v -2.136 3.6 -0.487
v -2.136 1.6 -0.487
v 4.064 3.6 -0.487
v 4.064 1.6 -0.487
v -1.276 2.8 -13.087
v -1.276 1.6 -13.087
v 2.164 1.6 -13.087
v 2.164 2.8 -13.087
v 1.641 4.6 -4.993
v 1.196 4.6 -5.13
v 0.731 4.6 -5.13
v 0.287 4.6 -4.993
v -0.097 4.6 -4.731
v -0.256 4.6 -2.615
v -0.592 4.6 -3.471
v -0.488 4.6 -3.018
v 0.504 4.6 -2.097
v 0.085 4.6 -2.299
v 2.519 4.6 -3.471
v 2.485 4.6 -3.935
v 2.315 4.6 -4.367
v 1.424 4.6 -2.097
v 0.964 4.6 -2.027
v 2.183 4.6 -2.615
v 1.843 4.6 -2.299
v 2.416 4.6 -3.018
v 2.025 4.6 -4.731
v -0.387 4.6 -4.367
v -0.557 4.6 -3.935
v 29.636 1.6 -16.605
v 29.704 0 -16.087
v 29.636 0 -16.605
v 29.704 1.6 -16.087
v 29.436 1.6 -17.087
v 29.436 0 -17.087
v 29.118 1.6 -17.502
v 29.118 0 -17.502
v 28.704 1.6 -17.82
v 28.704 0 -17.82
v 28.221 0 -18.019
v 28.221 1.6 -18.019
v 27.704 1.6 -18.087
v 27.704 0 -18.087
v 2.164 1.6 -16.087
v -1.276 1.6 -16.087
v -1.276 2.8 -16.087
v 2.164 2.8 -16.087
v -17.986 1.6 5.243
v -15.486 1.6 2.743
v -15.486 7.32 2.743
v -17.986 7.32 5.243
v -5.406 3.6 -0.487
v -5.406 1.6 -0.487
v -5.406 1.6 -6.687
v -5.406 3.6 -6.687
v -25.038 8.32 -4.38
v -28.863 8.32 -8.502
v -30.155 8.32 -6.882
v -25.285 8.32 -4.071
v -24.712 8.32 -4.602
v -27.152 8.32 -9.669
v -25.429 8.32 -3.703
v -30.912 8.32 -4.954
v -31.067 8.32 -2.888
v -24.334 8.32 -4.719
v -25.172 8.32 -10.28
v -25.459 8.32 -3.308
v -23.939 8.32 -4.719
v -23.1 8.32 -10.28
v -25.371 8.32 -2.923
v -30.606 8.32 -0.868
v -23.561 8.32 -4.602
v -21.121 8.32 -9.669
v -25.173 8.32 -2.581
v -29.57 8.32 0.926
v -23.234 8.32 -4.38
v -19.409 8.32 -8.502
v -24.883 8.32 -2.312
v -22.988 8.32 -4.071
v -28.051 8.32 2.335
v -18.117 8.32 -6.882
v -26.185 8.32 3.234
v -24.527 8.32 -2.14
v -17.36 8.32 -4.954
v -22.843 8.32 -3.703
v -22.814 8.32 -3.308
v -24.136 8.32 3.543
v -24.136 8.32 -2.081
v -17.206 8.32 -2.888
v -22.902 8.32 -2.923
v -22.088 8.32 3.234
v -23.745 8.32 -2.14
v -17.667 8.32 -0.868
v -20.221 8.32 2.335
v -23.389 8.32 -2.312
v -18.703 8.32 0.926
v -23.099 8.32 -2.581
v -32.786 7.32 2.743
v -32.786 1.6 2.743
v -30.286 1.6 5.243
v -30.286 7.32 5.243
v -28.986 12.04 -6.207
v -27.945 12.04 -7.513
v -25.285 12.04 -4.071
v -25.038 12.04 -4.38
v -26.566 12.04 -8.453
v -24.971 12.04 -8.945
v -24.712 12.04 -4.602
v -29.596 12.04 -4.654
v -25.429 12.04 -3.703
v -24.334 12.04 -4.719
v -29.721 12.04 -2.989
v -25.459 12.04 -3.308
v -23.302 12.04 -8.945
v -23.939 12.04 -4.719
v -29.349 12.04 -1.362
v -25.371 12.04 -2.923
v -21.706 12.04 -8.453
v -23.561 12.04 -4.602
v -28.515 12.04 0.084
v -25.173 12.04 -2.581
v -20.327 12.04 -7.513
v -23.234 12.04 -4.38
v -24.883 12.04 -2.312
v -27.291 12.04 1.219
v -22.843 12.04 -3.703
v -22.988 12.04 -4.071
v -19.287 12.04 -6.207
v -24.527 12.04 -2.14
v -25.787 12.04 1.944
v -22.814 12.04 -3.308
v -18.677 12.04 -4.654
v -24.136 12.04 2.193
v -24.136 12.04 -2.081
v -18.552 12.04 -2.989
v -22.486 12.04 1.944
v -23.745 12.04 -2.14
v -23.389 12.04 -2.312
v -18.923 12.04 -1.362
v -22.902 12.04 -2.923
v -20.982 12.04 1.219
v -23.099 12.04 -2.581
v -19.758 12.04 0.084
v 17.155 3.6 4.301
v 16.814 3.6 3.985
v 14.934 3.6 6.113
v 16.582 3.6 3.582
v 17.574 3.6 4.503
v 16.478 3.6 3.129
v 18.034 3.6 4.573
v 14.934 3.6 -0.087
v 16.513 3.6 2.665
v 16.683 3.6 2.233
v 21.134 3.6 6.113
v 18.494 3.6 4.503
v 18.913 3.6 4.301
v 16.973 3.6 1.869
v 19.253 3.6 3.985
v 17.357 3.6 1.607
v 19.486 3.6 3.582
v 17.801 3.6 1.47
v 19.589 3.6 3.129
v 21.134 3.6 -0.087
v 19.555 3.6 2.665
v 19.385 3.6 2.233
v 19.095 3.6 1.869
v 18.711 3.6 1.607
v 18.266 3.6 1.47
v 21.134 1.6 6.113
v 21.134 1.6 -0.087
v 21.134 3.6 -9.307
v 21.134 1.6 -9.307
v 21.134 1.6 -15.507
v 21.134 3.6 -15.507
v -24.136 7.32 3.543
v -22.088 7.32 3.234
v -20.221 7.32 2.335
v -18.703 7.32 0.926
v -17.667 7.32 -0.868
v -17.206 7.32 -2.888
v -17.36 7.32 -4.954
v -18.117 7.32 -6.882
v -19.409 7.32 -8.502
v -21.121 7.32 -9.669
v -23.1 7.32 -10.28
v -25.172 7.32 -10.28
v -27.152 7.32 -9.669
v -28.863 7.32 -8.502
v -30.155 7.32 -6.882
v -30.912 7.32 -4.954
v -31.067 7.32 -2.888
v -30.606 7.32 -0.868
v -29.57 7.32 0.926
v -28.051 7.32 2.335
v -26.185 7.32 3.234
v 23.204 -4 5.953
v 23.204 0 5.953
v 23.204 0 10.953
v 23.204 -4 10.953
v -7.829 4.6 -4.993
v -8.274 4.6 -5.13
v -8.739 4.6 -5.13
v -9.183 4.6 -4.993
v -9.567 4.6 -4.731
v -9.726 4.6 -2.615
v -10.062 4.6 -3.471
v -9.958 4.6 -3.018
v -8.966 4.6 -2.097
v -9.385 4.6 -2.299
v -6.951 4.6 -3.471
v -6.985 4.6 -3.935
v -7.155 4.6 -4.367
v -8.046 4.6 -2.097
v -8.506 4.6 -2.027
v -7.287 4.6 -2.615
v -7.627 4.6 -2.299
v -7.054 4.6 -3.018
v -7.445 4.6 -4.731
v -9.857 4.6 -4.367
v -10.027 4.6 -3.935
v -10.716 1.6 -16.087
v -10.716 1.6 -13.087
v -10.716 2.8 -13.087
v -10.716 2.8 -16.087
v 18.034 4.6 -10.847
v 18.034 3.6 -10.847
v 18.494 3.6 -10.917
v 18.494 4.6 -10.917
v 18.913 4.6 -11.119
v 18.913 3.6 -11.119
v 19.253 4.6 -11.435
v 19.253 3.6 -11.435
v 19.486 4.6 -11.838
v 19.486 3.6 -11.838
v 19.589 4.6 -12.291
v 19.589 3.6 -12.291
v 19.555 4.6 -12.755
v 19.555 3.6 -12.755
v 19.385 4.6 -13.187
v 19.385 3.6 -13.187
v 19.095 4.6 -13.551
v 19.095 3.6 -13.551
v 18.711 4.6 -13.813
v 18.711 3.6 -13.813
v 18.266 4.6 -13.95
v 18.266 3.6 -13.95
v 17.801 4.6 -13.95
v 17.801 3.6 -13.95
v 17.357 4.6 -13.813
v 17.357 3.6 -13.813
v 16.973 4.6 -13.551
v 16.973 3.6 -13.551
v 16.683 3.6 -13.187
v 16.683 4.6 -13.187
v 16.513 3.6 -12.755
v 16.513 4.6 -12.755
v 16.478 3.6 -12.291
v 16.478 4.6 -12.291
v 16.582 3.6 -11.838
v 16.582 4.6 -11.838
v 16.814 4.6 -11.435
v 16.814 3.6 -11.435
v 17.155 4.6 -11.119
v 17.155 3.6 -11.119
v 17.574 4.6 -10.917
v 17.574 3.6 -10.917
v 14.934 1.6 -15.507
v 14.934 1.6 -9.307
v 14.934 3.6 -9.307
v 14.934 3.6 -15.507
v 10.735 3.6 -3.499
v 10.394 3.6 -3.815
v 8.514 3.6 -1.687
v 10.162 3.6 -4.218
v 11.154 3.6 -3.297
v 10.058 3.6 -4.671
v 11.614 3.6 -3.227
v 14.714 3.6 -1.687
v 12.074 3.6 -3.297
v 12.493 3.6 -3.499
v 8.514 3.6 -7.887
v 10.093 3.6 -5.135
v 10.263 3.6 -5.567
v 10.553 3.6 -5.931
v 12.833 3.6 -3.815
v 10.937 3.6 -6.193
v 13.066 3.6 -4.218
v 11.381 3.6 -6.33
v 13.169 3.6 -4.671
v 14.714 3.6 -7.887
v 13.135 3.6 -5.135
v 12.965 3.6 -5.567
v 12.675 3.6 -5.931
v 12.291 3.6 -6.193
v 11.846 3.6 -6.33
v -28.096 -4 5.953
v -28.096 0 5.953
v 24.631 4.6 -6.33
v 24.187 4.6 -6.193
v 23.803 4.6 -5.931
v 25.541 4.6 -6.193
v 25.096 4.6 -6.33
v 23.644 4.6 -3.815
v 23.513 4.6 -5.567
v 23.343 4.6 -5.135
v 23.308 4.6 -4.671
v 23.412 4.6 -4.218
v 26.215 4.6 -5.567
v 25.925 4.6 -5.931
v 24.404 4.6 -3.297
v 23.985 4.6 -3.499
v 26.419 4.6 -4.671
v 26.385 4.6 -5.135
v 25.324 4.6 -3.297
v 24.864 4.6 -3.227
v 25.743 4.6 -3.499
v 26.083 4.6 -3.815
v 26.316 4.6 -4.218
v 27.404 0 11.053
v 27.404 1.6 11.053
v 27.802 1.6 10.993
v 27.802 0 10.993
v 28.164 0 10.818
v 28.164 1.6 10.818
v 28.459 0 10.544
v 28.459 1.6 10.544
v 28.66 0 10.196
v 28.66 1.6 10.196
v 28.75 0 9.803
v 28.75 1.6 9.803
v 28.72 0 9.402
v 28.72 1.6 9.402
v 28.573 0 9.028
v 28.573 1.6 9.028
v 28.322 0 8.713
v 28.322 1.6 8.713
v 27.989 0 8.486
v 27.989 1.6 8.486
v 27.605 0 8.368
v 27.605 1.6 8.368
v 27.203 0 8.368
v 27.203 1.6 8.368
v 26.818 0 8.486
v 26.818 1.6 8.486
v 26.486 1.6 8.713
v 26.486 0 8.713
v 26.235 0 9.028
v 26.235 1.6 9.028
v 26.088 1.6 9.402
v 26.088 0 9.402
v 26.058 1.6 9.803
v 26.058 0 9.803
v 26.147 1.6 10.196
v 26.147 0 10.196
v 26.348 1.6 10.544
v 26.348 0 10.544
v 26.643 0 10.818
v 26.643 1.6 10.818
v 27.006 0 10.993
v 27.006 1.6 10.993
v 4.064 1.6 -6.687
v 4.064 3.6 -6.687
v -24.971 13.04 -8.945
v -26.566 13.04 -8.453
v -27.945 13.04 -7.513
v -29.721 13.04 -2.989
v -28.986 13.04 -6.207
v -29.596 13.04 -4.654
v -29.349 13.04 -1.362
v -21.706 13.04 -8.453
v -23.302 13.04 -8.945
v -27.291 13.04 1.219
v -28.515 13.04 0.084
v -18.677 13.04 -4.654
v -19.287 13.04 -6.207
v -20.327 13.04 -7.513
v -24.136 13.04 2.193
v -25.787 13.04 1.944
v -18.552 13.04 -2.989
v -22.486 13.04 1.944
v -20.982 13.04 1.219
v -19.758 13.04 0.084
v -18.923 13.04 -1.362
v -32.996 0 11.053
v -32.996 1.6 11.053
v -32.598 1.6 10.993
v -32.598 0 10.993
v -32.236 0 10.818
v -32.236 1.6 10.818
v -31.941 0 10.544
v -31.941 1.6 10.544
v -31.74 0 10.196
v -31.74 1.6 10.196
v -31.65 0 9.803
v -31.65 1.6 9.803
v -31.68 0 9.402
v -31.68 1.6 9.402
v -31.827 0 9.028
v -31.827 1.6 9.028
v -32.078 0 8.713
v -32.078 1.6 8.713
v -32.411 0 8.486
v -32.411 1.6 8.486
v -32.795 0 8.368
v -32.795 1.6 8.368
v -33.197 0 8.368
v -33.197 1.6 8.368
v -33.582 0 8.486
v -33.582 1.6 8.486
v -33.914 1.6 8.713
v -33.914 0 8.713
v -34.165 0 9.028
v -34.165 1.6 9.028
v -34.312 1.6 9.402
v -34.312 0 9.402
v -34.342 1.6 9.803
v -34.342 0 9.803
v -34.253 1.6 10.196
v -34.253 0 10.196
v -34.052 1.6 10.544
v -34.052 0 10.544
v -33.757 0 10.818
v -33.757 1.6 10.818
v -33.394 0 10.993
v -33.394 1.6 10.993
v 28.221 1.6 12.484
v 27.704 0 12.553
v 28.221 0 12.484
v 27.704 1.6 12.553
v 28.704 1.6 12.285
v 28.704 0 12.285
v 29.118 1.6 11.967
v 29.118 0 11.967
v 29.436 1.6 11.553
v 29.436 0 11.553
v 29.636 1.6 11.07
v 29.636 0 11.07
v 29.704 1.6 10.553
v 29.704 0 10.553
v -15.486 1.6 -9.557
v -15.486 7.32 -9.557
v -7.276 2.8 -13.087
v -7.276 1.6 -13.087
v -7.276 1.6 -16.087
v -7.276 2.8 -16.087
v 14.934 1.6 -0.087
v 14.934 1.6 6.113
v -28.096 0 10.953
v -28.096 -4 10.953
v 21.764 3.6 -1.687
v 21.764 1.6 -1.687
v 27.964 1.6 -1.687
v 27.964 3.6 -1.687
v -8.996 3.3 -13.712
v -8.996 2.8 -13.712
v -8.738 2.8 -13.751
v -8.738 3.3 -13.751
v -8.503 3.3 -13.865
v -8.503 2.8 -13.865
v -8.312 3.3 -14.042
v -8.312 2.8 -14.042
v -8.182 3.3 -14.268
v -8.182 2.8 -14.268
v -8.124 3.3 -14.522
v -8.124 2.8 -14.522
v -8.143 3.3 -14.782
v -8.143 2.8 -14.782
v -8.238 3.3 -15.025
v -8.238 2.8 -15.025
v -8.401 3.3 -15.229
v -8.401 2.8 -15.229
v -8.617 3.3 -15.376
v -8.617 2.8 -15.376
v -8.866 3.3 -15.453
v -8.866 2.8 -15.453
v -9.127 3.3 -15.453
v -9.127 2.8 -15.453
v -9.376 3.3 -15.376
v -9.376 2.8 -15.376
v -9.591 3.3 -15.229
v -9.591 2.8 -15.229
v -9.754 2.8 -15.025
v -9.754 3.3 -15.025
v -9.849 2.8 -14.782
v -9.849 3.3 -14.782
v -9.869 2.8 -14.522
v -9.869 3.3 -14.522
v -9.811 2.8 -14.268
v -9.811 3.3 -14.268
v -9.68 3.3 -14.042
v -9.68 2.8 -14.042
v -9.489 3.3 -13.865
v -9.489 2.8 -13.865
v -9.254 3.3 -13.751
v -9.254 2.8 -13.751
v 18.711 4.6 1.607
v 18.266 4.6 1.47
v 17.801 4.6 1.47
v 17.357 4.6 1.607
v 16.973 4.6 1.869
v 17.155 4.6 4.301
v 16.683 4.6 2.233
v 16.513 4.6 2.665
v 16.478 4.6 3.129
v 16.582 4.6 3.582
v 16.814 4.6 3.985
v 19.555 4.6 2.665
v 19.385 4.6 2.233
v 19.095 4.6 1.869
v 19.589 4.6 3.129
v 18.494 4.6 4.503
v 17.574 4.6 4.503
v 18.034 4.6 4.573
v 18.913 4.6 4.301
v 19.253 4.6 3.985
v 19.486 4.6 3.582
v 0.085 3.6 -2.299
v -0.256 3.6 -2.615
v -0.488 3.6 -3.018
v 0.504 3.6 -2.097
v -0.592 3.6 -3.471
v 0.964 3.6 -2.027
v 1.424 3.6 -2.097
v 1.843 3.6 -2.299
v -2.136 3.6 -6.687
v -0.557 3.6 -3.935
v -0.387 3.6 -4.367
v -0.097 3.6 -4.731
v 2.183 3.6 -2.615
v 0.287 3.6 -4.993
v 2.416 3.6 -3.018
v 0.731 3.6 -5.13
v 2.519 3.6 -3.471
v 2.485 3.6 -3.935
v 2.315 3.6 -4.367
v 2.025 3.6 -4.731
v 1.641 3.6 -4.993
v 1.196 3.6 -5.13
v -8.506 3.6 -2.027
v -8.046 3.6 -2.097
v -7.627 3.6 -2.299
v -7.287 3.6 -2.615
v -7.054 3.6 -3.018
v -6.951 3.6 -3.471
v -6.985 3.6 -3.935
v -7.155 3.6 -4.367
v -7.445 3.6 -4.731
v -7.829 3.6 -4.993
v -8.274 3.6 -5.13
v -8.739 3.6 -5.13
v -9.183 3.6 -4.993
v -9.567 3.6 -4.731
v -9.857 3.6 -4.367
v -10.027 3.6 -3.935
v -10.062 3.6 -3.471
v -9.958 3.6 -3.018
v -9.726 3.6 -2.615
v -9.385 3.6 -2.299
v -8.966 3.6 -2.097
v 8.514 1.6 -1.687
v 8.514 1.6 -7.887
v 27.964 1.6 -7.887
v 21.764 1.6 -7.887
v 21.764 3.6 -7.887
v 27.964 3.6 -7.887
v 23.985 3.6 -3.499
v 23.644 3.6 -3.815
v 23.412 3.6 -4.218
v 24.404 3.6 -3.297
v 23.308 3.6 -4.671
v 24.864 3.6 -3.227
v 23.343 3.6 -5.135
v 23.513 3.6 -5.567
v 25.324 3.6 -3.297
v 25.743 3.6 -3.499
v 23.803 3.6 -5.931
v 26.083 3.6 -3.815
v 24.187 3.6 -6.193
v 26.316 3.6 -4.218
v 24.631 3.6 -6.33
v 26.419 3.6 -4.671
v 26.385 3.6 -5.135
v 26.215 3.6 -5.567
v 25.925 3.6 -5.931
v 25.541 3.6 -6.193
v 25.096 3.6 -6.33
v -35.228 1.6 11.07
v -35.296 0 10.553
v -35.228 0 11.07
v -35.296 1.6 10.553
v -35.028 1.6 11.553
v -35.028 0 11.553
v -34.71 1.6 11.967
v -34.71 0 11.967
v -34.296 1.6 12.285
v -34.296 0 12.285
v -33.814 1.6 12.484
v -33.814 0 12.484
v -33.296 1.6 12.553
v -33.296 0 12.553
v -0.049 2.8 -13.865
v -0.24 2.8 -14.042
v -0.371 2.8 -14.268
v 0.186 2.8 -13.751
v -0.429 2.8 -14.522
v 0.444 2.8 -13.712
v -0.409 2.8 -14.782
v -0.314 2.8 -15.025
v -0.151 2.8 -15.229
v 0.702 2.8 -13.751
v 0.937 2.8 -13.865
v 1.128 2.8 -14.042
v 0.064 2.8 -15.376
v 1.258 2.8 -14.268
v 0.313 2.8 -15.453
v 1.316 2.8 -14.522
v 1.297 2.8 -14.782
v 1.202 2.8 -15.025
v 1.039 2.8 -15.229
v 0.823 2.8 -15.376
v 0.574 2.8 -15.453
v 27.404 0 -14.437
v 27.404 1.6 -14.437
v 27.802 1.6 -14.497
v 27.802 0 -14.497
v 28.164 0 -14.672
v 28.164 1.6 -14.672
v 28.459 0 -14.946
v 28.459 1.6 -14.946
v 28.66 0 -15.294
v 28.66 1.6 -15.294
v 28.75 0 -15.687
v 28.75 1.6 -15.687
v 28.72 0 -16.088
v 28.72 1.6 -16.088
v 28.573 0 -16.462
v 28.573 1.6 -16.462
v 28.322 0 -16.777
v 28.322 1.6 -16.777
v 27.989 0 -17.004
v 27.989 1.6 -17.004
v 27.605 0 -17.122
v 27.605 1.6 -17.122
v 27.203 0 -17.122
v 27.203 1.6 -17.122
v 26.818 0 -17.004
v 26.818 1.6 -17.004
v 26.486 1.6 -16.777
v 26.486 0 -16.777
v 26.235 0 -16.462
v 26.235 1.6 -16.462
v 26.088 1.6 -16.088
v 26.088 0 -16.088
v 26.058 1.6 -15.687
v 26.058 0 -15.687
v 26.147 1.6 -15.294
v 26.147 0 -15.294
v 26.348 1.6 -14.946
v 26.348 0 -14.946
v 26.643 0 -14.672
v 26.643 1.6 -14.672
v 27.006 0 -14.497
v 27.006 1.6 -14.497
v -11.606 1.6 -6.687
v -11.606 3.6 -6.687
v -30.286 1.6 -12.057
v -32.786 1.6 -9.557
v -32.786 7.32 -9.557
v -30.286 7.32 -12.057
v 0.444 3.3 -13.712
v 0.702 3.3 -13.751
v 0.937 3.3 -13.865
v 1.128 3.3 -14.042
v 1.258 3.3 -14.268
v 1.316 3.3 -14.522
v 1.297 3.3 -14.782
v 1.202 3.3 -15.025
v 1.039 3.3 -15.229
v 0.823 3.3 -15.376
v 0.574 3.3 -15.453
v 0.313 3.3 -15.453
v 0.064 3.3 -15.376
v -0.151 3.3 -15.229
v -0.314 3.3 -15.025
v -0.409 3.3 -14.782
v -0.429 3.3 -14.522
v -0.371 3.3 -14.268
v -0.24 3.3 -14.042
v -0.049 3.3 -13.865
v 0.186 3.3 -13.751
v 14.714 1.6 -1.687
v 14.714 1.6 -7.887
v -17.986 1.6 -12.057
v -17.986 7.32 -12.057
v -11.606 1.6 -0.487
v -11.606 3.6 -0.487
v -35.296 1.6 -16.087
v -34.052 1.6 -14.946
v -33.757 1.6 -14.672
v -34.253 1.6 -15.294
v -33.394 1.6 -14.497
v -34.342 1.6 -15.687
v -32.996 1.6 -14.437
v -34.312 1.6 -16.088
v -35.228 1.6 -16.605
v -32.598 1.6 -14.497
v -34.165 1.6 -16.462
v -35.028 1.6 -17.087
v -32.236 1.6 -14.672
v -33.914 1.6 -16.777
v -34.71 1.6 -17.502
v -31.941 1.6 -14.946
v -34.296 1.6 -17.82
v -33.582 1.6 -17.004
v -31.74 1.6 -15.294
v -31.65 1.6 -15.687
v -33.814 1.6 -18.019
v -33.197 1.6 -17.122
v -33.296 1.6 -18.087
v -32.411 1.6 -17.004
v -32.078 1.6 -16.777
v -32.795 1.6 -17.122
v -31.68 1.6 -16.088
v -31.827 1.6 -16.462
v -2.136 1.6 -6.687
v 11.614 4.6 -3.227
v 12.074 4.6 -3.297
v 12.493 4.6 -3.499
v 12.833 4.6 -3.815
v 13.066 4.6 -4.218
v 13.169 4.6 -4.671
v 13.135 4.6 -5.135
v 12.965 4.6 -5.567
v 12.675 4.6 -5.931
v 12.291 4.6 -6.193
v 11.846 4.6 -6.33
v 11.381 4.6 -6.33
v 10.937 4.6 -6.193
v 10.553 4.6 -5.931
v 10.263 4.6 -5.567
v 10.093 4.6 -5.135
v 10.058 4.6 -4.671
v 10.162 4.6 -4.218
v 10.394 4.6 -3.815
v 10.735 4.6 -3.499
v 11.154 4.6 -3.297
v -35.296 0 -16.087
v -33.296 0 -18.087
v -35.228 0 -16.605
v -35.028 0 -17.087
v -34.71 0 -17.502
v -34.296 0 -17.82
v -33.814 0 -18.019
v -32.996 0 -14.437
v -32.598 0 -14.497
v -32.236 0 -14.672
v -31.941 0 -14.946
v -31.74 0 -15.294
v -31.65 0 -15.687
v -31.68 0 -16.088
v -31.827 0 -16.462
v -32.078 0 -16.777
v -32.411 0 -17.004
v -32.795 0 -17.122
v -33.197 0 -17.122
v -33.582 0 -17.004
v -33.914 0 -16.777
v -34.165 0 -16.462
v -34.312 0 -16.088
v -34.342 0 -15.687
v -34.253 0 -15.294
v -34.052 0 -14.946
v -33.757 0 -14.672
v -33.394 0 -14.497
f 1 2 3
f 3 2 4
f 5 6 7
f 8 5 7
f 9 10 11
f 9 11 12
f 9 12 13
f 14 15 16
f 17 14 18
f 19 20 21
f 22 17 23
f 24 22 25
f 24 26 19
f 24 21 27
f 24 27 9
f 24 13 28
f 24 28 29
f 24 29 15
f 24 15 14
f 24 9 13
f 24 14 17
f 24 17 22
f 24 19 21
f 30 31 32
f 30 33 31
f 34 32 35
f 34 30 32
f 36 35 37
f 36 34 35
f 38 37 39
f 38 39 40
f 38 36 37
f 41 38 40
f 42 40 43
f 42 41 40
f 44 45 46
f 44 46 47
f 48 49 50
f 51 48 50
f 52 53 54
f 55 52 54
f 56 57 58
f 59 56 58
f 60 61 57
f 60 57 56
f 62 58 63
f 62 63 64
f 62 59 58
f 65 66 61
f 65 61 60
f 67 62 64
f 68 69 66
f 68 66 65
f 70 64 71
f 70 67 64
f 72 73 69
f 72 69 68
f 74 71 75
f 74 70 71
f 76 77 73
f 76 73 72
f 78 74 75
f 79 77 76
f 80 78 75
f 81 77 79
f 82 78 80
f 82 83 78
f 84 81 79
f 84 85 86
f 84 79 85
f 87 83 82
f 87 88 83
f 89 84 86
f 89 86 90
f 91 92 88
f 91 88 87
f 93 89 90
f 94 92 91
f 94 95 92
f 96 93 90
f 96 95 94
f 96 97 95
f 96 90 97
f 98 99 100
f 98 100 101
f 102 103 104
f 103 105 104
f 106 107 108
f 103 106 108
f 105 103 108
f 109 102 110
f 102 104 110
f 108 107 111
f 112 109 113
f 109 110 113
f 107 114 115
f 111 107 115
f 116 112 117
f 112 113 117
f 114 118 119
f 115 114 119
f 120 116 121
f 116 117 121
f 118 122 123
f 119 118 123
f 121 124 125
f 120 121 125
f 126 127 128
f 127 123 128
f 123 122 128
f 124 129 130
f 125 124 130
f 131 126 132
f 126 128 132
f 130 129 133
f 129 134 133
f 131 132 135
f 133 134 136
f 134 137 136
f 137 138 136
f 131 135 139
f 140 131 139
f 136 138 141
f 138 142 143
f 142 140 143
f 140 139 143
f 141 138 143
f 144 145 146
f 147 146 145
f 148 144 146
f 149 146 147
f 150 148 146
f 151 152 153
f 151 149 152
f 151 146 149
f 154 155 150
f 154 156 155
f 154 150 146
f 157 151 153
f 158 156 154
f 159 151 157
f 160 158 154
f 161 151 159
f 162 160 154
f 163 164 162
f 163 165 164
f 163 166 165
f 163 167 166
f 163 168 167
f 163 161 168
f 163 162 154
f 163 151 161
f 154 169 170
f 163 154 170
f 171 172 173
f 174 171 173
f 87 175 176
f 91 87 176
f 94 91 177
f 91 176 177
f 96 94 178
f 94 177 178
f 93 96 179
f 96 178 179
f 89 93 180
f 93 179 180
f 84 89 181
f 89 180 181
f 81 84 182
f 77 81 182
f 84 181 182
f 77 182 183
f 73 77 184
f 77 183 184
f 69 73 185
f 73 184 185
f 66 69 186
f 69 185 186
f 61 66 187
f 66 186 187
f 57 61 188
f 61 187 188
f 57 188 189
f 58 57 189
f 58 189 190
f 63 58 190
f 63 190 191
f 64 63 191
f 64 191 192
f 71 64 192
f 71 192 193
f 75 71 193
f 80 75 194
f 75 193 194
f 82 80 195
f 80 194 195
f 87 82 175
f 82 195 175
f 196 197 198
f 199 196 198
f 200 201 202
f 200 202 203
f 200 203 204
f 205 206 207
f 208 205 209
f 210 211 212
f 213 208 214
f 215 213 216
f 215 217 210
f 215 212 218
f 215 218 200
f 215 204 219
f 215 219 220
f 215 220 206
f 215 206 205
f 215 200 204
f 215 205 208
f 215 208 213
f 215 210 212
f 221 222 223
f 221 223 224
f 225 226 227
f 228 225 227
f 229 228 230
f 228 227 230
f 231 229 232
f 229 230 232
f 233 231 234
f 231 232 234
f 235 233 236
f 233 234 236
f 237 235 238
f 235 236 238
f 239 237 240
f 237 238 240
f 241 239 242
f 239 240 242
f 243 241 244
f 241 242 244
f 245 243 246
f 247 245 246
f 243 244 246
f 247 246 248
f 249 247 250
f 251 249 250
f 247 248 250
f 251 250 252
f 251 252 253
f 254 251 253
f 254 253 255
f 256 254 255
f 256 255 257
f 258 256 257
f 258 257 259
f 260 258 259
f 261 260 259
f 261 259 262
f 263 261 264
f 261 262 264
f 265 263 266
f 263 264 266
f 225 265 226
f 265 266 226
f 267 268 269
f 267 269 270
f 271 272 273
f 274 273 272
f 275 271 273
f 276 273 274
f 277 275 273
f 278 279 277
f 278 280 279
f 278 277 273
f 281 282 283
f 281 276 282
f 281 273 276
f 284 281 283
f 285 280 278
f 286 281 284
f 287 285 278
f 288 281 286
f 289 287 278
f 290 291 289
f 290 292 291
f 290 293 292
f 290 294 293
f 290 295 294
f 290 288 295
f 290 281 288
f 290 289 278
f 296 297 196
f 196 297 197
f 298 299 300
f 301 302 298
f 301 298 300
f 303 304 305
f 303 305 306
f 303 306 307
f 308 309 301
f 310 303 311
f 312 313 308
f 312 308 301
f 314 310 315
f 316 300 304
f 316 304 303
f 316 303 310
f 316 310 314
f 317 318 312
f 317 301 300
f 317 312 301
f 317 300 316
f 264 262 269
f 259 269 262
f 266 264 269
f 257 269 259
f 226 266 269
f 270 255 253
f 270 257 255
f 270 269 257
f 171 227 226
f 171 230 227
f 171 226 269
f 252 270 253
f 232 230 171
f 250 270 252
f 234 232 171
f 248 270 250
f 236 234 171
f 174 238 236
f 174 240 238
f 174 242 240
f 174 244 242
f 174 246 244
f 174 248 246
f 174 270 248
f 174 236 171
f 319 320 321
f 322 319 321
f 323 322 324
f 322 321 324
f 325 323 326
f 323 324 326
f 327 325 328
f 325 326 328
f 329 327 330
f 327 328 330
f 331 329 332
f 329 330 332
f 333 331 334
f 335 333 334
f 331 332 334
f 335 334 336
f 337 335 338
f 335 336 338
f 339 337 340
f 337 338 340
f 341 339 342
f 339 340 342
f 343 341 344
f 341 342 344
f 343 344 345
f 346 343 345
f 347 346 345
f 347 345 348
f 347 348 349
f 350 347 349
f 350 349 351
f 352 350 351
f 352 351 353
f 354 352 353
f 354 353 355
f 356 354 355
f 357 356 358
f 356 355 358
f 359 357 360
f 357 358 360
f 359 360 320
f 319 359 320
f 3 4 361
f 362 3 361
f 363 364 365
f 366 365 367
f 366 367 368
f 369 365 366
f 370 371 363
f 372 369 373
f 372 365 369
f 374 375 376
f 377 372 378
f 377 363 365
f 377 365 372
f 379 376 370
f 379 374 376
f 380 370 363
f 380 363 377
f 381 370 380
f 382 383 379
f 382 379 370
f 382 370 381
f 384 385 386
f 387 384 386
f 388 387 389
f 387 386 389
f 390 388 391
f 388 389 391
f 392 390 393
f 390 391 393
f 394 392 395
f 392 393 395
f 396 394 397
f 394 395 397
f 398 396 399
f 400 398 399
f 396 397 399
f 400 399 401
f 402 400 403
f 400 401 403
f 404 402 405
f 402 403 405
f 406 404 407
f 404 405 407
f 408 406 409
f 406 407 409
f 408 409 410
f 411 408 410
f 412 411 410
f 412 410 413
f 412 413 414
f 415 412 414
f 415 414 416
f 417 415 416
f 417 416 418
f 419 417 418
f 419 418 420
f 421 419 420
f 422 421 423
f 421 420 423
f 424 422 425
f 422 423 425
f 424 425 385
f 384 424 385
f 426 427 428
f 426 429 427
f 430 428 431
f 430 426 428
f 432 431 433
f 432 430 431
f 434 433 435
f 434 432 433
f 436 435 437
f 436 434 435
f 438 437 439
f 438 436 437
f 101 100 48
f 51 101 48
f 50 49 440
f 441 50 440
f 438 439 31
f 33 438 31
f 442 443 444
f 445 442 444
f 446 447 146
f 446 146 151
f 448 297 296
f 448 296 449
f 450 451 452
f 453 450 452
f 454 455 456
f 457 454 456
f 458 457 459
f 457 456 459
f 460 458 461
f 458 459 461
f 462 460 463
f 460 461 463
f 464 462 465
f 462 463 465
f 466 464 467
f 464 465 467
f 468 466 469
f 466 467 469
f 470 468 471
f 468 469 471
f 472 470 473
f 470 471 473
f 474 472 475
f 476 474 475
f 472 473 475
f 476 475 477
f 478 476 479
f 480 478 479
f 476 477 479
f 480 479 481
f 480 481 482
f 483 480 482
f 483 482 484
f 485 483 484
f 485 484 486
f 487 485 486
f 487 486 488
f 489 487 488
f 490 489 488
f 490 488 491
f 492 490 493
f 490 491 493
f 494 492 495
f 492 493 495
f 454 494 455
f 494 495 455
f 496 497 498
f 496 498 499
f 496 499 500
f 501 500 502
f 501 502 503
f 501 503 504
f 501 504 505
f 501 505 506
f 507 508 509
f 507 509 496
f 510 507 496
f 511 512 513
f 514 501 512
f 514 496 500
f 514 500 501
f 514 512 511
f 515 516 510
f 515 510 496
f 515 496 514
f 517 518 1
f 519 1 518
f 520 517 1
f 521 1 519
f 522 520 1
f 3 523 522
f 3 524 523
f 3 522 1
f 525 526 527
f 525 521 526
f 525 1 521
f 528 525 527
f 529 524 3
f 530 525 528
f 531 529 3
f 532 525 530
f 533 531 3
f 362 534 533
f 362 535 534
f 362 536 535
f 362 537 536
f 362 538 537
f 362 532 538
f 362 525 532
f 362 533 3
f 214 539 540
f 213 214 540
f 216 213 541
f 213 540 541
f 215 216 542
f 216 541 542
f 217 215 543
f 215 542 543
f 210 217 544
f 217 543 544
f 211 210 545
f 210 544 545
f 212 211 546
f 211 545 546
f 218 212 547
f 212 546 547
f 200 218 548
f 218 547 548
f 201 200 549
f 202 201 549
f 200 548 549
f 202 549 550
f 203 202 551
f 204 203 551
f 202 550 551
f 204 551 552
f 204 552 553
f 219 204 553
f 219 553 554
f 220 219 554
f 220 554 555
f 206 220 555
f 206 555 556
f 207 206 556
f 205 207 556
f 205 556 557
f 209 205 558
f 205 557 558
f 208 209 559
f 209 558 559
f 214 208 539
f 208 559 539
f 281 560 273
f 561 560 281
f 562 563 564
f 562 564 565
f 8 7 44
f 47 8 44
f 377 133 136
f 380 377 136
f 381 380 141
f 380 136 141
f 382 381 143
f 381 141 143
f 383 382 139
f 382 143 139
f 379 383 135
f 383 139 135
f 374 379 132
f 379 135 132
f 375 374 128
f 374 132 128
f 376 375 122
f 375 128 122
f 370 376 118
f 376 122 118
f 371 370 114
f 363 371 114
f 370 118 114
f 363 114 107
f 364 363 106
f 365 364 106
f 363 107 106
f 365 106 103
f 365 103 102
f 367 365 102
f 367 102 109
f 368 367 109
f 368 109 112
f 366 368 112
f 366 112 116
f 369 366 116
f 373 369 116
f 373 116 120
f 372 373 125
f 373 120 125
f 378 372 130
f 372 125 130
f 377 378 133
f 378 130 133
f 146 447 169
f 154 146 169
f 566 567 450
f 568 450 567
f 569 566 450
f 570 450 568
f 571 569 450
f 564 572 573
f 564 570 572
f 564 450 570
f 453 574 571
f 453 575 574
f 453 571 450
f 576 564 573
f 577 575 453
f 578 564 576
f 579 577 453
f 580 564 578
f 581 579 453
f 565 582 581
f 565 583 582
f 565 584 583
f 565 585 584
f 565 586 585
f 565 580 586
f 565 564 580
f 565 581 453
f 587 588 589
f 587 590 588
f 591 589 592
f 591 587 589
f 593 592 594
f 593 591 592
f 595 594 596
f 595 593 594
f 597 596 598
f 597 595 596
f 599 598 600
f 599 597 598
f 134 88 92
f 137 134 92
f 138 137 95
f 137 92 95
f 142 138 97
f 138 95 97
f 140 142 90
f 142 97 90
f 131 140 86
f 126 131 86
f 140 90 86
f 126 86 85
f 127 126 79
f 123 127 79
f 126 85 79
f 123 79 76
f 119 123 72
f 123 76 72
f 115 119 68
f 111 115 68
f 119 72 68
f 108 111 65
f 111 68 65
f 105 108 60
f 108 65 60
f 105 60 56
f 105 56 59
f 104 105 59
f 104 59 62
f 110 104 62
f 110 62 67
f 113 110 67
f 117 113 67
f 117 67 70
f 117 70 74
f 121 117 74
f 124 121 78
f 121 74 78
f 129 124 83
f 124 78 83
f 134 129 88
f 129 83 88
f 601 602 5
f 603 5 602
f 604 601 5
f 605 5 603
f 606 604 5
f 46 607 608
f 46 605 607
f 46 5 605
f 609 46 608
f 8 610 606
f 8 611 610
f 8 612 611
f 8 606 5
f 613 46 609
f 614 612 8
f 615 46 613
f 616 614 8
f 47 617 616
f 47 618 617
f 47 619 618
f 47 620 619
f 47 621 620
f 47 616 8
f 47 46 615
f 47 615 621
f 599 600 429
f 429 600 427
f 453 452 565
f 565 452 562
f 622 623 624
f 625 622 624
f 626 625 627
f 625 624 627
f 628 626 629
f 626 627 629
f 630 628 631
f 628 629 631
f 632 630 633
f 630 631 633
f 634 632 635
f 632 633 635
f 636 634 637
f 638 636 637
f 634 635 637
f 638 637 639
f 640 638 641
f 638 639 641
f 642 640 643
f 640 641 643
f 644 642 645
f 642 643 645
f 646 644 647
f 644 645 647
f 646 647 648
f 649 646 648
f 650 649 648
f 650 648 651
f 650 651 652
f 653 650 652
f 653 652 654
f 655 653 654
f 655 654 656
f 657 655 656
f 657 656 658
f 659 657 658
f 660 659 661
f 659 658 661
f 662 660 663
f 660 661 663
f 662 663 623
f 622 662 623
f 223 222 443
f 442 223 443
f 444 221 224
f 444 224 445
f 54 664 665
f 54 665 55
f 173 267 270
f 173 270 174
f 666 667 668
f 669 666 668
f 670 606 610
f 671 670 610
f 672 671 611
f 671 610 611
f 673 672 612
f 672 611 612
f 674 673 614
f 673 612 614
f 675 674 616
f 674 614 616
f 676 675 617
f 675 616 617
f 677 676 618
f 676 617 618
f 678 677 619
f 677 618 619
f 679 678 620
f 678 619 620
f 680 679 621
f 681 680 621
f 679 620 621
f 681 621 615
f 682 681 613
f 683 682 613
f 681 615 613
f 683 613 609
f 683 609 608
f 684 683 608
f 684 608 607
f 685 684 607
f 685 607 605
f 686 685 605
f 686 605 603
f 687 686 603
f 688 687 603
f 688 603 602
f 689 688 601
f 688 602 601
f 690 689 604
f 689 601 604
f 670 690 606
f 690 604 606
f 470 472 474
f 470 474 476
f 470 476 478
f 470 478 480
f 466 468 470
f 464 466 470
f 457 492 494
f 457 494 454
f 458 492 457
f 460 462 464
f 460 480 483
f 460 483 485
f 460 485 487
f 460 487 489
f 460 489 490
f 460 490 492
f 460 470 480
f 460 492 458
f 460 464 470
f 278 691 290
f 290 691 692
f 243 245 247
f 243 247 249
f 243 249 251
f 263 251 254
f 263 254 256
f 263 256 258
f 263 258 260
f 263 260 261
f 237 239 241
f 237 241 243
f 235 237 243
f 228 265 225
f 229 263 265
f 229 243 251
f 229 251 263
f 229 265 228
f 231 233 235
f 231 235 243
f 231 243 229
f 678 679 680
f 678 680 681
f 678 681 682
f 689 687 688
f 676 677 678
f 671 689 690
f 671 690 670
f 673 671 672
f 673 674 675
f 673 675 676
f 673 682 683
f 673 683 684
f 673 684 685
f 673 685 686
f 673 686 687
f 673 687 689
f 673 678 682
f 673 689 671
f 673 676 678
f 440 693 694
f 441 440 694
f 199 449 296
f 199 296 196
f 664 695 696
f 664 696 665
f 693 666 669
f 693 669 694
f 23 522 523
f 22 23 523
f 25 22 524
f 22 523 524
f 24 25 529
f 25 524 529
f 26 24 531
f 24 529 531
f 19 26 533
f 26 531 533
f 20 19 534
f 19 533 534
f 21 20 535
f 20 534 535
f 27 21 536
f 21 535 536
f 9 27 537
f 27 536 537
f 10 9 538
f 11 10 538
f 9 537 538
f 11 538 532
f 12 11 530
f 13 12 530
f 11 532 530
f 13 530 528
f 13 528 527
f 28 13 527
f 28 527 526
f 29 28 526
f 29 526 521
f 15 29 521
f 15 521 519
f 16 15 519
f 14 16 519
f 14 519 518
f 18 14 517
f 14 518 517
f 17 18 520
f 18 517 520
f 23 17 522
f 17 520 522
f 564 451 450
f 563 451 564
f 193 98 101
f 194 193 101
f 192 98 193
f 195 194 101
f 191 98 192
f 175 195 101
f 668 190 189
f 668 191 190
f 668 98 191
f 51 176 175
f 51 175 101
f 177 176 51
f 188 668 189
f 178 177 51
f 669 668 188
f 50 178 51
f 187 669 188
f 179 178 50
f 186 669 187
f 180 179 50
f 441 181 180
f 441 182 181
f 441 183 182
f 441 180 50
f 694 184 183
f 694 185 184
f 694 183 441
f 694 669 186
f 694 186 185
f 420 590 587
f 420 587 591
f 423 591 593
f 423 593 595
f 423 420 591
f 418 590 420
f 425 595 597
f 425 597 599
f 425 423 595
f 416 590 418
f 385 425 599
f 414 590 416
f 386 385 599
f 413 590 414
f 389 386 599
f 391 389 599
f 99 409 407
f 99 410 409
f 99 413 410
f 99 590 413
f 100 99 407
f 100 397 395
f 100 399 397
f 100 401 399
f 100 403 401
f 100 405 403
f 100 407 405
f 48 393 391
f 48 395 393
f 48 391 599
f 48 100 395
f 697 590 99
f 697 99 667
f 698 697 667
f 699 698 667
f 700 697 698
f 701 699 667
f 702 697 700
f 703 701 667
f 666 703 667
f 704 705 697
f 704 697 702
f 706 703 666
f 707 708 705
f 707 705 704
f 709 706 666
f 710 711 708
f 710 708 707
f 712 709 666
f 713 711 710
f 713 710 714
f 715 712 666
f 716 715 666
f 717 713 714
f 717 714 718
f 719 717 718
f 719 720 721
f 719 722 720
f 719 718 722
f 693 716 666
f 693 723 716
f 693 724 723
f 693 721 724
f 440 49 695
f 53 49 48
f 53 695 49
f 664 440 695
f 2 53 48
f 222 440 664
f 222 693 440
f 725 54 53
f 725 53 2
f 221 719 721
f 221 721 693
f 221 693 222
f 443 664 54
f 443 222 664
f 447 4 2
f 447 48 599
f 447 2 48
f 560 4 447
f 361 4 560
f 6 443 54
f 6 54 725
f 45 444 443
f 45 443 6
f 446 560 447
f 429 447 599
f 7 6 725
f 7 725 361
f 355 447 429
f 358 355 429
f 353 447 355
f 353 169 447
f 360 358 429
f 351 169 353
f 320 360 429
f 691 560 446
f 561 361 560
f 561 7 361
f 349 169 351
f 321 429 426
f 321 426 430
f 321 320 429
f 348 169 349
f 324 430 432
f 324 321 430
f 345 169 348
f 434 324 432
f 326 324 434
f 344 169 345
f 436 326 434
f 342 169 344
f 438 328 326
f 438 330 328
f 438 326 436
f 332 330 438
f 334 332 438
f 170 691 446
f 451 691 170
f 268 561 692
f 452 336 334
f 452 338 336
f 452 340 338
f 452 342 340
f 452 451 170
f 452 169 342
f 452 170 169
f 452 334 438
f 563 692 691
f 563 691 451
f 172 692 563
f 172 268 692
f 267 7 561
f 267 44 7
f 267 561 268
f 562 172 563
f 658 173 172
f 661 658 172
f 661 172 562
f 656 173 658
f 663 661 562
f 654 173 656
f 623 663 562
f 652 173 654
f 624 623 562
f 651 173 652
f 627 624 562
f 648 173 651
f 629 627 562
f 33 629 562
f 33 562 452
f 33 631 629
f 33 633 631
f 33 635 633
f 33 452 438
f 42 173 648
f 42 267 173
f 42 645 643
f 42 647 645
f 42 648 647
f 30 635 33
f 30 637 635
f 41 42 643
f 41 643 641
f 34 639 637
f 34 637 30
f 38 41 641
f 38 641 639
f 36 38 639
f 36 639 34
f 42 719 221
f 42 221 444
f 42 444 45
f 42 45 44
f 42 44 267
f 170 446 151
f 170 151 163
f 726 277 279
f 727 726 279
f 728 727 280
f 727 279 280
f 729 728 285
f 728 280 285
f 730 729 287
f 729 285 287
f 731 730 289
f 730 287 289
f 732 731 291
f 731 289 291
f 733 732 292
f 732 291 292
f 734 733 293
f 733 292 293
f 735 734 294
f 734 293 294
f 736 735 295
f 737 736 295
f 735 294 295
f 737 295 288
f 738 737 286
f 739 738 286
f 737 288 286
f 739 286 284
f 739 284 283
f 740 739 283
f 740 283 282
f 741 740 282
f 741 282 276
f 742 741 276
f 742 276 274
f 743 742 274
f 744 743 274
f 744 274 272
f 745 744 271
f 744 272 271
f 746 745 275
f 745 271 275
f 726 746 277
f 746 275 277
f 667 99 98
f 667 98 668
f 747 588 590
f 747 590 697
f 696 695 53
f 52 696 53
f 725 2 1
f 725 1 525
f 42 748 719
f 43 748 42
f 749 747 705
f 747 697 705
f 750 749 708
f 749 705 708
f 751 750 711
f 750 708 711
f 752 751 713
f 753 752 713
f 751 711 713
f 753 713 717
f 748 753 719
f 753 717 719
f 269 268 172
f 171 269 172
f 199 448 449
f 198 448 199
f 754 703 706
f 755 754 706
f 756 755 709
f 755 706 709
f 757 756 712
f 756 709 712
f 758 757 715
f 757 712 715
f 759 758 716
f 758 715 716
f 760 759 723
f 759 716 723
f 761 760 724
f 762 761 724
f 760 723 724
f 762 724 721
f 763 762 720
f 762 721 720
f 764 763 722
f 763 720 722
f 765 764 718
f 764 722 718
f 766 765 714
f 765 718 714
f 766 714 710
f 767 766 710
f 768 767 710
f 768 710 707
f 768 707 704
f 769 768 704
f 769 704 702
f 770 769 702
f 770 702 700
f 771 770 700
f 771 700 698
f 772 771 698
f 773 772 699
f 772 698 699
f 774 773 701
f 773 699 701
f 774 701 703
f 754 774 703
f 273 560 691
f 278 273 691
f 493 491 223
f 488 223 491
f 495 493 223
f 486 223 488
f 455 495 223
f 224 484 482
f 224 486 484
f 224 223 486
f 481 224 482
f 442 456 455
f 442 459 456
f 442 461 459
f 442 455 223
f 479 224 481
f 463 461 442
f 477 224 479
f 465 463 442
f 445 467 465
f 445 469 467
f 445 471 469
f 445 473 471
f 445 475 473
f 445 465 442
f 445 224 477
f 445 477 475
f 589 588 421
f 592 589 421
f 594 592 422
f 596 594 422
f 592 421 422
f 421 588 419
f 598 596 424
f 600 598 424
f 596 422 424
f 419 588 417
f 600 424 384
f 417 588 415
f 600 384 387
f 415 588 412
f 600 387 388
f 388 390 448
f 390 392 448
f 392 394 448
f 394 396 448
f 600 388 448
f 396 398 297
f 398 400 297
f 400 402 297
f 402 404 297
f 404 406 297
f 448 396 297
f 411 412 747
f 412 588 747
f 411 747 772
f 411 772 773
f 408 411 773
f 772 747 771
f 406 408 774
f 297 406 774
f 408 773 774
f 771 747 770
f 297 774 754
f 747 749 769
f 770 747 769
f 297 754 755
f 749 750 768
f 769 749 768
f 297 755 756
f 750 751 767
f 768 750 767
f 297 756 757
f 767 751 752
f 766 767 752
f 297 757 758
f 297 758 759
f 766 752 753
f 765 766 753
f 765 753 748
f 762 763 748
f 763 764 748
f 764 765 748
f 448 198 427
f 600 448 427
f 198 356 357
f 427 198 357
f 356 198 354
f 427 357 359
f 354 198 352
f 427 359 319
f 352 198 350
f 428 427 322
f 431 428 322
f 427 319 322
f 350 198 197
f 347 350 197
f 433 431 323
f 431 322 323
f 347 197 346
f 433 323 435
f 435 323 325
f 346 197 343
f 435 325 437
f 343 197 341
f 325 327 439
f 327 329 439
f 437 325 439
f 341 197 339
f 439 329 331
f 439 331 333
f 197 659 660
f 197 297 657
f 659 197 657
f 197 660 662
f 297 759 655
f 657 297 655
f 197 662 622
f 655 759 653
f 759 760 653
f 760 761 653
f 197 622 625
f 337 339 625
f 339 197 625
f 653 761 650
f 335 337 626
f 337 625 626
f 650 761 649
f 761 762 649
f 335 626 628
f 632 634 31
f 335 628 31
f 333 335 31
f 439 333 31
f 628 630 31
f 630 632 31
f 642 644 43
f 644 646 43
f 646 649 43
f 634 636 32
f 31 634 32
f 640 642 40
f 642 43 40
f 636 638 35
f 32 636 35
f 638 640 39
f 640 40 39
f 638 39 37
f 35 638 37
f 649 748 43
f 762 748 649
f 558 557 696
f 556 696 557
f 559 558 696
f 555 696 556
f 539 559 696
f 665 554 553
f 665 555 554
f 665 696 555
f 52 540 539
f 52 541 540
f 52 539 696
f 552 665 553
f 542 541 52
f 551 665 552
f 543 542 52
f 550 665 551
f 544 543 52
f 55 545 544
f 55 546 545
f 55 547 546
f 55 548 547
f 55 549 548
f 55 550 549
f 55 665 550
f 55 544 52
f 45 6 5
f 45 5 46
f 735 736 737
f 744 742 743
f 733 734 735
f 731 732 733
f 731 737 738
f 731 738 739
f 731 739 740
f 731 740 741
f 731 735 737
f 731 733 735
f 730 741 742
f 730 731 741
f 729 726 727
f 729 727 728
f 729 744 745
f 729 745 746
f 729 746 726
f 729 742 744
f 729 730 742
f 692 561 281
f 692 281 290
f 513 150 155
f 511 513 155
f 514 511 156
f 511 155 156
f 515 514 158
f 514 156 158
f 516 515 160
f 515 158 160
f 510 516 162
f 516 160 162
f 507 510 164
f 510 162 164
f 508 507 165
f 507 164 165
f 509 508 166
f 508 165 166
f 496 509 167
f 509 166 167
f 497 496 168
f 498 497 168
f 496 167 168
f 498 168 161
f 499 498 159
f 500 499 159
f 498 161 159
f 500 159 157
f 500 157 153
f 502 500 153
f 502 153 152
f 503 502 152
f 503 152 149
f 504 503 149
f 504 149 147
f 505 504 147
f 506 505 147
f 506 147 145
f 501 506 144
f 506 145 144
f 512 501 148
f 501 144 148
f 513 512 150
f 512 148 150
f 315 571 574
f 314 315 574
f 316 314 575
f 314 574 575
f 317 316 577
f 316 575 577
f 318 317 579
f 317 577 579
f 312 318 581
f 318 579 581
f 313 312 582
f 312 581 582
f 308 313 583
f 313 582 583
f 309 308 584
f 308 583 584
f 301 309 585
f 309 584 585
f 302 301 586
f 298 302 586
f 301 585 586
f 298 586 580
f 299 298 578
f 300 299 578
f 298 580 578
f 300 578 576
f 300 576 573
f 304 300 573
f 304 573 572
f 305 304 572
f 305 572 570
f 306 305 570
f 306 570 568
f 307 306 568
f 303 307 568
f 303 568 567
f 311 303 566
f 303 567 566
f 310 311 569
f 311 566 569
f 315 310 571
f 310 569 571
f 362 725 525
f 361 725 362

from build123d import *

# Parameters (mm, degrees)
SKETCH_1_W          = 65
SKETCH_1_H          = 30.64
EXTRUDE_1_DEPTH     = 1.6
FILLET_1_R          = 2
SKETCH_2_R          = 1.35
CUT_EXTRUDE_1_DEPTH = 1.6
SKETCH_3_W          = 51.3
SKETCH_3_H          = 5
EXTRUDE_2_DEPTH     = 4
SKETCH_4_W          = 17.3
SKETCH_4_H          = 17.3
EXTRUDE_3_DEPTH     = 5.72
CHAMFER_1_SIZE      = 2.5
SKETCH_5_R          = 6.95
EXTRUDE_4_DEPTH     = 1
SKETCH_6_R          = 1.326147724
EXTRUDE_5_DEPTH     = 3.72
SKETCH_7_R          = 5.6
EXTRUDE_6_DEPTH     = 1
SKETCH_8_W          = 6.2
SKETCH_8_H          = 6.2
EXTRUDE_7_DEPTH     = 2
SKETCH_9_R          = 1.56
EXTRUDE_8_DEPTH     = 1
SKETCH_10_W         = 3.44
SKETCH_10_H         = 3
EXTRUDE_9_DEPTH     = 1.2
SKETCH_11_R         = 0.875
EXTRUDE_10_DEPTH    = 0.5


with BuildPart() as part:
    # 草图1 → 凸台-拉伸1 (new body)
    with BuildSketch(Plane(origin=(0, 0, 0), x_dir=(1, 0, 0), z_dir=(0, 1, 0))):
        with Locations((-2.796247961, 2.767463295)):
            Rectangle(SKETCH_1_W, SKETCH_1_H)
    extrude(amount=EXTRUDE_1_DEPTH)

    # 圆角1
    fillet_1_edges = [part.edges().sort_by_distance(p)[0] for p in [
        (-35.296247961, 0.8, -18.087463295),
        (29.703752039, 0.8, -18.087463295),
        (29.703752039, 0.8, 12.552536705),
        (-35.296247961, 0.8, 12.552536705),
    ]]
    fillet(fillet_1_edges, radius=FILLET_1_R)

    # 草图2 → 切除-拉伸1 (cut)
    with BuildSketch(Plane(origin=(0, 1.6, 0), x_dir=(1, 0, 0), z_dir=(0, 1, 0))):
        with Locations(Location((-32.996247961, 15.787463295, 0), (0, 0, 270))):  # turned: the seam where the file's is
            Circle(SKETCH_2_R)
        with Locations(Location((27.403752039, 15.787463295, 0), (0, 0, 270))):  # turned: the seam where the file's is
            Circle(SKETCH_2_R)
        with Locations(Location((27.403752039, -9.702536705, 0), (0, 0, 270))):  # turned: the seam where the file's is
            Circle(SKETCH_2_R)
        with Locations(Location((-32.996247961, -9.702536705, 0), (0, 0, 270))):  # turned: the seam where the file's is
            Circle(SKETCH_2_R)
    extrude(amount=-CUT_EXTRUDE_1_DEPTH, mode=Mode.SUBTRACT)

    # 草图3 → 凸台-拉伸2 (add)
    with BuildSketch(Plane.XZ):
        with Locations((-2.446247961, 8.452536705)):
            Rectangle(SKETCH_3_W, SKETCH_3_H)
    extrude(amount=EXTRUDE_2_DEPTH)

    # 草图4 → 凸台-拉伸3 (add)
    with BuildSketch(Plane(origin=(0, 1.6, 0), x_dir=(1, 0, 0), z_dir=(0, 1, 0))):
        with Locations((-24.136247961, 3.407463295)):
            Rectangle(SKETCH_4_W, SKETCH_4_H)
    extrude(amount=EXTRUDE_3_DEPTH)

    # 倒角1
    chamfer_1_edges = [part.edges().sort_by_distance(p)[0] for p in [
        (-32.786247961, 4.46, -12.057463295),
        (-32.786247961, 4.46, 5.242536705),
        (-15.486247961, 4.46, 5.242536705),
        (-15.486247961, 4.46, -12.057463295),
    ]]
    chamfer(chamfer_1_edges, length=CHAMFER_1_SIZE)

    # 草图5 → 凸台-拉伸4 (add)
    with BuildSketch(Plane(origin=(0, 7.32, 0), x_dir=(1, 0, 0), z_dir=(0, 1, 0))):
        with Locations(Location((-24.136247961, 3.407463295, 0), (0, 0, 270))):  # turned: the seam where the file's is
            Circle(SKETCH_5_R)
    extrude(amount=EXTRUDE_4_DEPTH)

    # 草图6 → 凸台-拉伸5 (add)
    with BuildSketch(Plane(origin=(0, 8.32, 0), x_dir=(1, 0, 0), z_dir=(0, 1, 0))):
        with Locations(Location((-24.136247961, 3.407463295, 0), (0, 0, 270))):  # turned: the seam where the file's is
            Circle(SKETCH_6_R)
    extrude(amount=EXTRUDE_5_DEPTH)

    # 草图7 → 凸台-拉伸6 (add)
    with BuildSketch(Plane(origin=(0, 12.04, 0), x_dir=(1, 0, 0), z_dir=(0, 1, 0))):
        with Locations(Location((-24.136247961, 3.407463295, 0), (0, 0, 270))):  # turned: the seam where the file's is
            Circle(SKETCH_7_R)
    extrude(amount=EXTRUDE_6_DEPTH)

    # 草图8 → 凸台-拉伸7 (add)
    with BuildSketch(Plane(origin=(0, 1.6, 0), x_dir=(1, 0, 0), z_dir=(0, 1, 0))):
        with Locations((-8.506247961, 3.587463295)):
            Rectangle(SKETCH_8_W, SKETCH_8_H)
        with Locations((0.963752039, 3.587463295)):
            Rectangle(SKETCH_8_W, SKETCH_8_H)
        with Locations((11.613752039, 4.787463295)):
            Rectangle(SKETCH_8_W, SKETCH_8_H)
        with Locations((18.033752039, 12.407463295)):
            Rectangle(SKETCH_8_W, SKETCH_8_H)
        with Locations((24.863752039, 4.787463295)):
            Rectangle(SKETCH_8_W, SKETCH_8_H)
        with Locations((18.033752039, -3.012536705)):
            Rectangle(SKETCH_8_W, SKETCH_8_H)
    extrude(amount=EXTRUDE_7_DEPTH)

    # 草图9 → 凸台-拉伸8 (add)
    with BuildSketch(Plane(origin=(0, 3.6, 0), x_dir=(1, 0, 0), z_dir=(0, 1, 0))):
        with Locations(Location((-8.506247961, 3.587463295, 0), (0, 0, 270))):  # turned: the seam where the file's is
            Circle(SKETCH_9_R)
        with Locations(Location((0.963752039, 3.587463295, 0), (0, 0, 270))):  # turned: the seam where the file's is
            Circle(SKETCH_9_R)
        with Locations(Location((11.613752039, 4.787463295, 0), (0, 0, 270))):  # turned: the seam where the file's is
            Circle(SKETCH_9_R)
        with Locations(Location((18.033752039, 12.407463295, 0), (0, 0, 270))):  # turned: the seam where the file's is
            Circle(SKETCH_9_R)
        with Locations(Location((24.863752039, 4.787463295, 0), (0, 0, 270))):  # turned: the seam where the file's is
            Circle(SKETCH_9_R)
        with Locations(Location((18.033752039, -3.012536705, 0), (0, 0, 270))):  # turned: the seam where the file's is
            Circle(SKETCH_9_R)
    extrude(amount=EXTRUDE_8_DEPTH)

    # 草图10 → 凸台-拉伸9 (add)
    with BuildSketch(Plane(origin=(0, 1.6, 0), x_dir=(1, 0, 0), z_dir=(0, 1, 0))):
        with Locations((-8.996247961, 14.587463295)):
            Rectangle(SKETCH_10_W, SKETCH_10_H)
        with Locations((0.443752039, 14.587463295)):
            Rectangle(SKETCH_10_W, SKETCH_10_H)
    extrude(amount=EXTRUDE_9_DEPTH)

    # 草图11 → 凸台-拉伸10 (add)
    with BuildSketch(Plane(origin=(0, 2.8, 0), x_dir=(1, 0, 0), z_dir=(0, 1, 0))):
        with Locations(Location((-8.996247961, 14.587463295, 0), (0, 0, 270))):  # turned: the seam where the file's is
            Circle(SKETCH_11_R)
        with Locations(Location((0.443752039, 14.587463295, 0), (0, 0, 270))):  # turned: the seam where the file's is
            Circle(SKETCH_11_R)
    extrude(amount=EXTRUDE_10_DEPTH)


solid = part.part
